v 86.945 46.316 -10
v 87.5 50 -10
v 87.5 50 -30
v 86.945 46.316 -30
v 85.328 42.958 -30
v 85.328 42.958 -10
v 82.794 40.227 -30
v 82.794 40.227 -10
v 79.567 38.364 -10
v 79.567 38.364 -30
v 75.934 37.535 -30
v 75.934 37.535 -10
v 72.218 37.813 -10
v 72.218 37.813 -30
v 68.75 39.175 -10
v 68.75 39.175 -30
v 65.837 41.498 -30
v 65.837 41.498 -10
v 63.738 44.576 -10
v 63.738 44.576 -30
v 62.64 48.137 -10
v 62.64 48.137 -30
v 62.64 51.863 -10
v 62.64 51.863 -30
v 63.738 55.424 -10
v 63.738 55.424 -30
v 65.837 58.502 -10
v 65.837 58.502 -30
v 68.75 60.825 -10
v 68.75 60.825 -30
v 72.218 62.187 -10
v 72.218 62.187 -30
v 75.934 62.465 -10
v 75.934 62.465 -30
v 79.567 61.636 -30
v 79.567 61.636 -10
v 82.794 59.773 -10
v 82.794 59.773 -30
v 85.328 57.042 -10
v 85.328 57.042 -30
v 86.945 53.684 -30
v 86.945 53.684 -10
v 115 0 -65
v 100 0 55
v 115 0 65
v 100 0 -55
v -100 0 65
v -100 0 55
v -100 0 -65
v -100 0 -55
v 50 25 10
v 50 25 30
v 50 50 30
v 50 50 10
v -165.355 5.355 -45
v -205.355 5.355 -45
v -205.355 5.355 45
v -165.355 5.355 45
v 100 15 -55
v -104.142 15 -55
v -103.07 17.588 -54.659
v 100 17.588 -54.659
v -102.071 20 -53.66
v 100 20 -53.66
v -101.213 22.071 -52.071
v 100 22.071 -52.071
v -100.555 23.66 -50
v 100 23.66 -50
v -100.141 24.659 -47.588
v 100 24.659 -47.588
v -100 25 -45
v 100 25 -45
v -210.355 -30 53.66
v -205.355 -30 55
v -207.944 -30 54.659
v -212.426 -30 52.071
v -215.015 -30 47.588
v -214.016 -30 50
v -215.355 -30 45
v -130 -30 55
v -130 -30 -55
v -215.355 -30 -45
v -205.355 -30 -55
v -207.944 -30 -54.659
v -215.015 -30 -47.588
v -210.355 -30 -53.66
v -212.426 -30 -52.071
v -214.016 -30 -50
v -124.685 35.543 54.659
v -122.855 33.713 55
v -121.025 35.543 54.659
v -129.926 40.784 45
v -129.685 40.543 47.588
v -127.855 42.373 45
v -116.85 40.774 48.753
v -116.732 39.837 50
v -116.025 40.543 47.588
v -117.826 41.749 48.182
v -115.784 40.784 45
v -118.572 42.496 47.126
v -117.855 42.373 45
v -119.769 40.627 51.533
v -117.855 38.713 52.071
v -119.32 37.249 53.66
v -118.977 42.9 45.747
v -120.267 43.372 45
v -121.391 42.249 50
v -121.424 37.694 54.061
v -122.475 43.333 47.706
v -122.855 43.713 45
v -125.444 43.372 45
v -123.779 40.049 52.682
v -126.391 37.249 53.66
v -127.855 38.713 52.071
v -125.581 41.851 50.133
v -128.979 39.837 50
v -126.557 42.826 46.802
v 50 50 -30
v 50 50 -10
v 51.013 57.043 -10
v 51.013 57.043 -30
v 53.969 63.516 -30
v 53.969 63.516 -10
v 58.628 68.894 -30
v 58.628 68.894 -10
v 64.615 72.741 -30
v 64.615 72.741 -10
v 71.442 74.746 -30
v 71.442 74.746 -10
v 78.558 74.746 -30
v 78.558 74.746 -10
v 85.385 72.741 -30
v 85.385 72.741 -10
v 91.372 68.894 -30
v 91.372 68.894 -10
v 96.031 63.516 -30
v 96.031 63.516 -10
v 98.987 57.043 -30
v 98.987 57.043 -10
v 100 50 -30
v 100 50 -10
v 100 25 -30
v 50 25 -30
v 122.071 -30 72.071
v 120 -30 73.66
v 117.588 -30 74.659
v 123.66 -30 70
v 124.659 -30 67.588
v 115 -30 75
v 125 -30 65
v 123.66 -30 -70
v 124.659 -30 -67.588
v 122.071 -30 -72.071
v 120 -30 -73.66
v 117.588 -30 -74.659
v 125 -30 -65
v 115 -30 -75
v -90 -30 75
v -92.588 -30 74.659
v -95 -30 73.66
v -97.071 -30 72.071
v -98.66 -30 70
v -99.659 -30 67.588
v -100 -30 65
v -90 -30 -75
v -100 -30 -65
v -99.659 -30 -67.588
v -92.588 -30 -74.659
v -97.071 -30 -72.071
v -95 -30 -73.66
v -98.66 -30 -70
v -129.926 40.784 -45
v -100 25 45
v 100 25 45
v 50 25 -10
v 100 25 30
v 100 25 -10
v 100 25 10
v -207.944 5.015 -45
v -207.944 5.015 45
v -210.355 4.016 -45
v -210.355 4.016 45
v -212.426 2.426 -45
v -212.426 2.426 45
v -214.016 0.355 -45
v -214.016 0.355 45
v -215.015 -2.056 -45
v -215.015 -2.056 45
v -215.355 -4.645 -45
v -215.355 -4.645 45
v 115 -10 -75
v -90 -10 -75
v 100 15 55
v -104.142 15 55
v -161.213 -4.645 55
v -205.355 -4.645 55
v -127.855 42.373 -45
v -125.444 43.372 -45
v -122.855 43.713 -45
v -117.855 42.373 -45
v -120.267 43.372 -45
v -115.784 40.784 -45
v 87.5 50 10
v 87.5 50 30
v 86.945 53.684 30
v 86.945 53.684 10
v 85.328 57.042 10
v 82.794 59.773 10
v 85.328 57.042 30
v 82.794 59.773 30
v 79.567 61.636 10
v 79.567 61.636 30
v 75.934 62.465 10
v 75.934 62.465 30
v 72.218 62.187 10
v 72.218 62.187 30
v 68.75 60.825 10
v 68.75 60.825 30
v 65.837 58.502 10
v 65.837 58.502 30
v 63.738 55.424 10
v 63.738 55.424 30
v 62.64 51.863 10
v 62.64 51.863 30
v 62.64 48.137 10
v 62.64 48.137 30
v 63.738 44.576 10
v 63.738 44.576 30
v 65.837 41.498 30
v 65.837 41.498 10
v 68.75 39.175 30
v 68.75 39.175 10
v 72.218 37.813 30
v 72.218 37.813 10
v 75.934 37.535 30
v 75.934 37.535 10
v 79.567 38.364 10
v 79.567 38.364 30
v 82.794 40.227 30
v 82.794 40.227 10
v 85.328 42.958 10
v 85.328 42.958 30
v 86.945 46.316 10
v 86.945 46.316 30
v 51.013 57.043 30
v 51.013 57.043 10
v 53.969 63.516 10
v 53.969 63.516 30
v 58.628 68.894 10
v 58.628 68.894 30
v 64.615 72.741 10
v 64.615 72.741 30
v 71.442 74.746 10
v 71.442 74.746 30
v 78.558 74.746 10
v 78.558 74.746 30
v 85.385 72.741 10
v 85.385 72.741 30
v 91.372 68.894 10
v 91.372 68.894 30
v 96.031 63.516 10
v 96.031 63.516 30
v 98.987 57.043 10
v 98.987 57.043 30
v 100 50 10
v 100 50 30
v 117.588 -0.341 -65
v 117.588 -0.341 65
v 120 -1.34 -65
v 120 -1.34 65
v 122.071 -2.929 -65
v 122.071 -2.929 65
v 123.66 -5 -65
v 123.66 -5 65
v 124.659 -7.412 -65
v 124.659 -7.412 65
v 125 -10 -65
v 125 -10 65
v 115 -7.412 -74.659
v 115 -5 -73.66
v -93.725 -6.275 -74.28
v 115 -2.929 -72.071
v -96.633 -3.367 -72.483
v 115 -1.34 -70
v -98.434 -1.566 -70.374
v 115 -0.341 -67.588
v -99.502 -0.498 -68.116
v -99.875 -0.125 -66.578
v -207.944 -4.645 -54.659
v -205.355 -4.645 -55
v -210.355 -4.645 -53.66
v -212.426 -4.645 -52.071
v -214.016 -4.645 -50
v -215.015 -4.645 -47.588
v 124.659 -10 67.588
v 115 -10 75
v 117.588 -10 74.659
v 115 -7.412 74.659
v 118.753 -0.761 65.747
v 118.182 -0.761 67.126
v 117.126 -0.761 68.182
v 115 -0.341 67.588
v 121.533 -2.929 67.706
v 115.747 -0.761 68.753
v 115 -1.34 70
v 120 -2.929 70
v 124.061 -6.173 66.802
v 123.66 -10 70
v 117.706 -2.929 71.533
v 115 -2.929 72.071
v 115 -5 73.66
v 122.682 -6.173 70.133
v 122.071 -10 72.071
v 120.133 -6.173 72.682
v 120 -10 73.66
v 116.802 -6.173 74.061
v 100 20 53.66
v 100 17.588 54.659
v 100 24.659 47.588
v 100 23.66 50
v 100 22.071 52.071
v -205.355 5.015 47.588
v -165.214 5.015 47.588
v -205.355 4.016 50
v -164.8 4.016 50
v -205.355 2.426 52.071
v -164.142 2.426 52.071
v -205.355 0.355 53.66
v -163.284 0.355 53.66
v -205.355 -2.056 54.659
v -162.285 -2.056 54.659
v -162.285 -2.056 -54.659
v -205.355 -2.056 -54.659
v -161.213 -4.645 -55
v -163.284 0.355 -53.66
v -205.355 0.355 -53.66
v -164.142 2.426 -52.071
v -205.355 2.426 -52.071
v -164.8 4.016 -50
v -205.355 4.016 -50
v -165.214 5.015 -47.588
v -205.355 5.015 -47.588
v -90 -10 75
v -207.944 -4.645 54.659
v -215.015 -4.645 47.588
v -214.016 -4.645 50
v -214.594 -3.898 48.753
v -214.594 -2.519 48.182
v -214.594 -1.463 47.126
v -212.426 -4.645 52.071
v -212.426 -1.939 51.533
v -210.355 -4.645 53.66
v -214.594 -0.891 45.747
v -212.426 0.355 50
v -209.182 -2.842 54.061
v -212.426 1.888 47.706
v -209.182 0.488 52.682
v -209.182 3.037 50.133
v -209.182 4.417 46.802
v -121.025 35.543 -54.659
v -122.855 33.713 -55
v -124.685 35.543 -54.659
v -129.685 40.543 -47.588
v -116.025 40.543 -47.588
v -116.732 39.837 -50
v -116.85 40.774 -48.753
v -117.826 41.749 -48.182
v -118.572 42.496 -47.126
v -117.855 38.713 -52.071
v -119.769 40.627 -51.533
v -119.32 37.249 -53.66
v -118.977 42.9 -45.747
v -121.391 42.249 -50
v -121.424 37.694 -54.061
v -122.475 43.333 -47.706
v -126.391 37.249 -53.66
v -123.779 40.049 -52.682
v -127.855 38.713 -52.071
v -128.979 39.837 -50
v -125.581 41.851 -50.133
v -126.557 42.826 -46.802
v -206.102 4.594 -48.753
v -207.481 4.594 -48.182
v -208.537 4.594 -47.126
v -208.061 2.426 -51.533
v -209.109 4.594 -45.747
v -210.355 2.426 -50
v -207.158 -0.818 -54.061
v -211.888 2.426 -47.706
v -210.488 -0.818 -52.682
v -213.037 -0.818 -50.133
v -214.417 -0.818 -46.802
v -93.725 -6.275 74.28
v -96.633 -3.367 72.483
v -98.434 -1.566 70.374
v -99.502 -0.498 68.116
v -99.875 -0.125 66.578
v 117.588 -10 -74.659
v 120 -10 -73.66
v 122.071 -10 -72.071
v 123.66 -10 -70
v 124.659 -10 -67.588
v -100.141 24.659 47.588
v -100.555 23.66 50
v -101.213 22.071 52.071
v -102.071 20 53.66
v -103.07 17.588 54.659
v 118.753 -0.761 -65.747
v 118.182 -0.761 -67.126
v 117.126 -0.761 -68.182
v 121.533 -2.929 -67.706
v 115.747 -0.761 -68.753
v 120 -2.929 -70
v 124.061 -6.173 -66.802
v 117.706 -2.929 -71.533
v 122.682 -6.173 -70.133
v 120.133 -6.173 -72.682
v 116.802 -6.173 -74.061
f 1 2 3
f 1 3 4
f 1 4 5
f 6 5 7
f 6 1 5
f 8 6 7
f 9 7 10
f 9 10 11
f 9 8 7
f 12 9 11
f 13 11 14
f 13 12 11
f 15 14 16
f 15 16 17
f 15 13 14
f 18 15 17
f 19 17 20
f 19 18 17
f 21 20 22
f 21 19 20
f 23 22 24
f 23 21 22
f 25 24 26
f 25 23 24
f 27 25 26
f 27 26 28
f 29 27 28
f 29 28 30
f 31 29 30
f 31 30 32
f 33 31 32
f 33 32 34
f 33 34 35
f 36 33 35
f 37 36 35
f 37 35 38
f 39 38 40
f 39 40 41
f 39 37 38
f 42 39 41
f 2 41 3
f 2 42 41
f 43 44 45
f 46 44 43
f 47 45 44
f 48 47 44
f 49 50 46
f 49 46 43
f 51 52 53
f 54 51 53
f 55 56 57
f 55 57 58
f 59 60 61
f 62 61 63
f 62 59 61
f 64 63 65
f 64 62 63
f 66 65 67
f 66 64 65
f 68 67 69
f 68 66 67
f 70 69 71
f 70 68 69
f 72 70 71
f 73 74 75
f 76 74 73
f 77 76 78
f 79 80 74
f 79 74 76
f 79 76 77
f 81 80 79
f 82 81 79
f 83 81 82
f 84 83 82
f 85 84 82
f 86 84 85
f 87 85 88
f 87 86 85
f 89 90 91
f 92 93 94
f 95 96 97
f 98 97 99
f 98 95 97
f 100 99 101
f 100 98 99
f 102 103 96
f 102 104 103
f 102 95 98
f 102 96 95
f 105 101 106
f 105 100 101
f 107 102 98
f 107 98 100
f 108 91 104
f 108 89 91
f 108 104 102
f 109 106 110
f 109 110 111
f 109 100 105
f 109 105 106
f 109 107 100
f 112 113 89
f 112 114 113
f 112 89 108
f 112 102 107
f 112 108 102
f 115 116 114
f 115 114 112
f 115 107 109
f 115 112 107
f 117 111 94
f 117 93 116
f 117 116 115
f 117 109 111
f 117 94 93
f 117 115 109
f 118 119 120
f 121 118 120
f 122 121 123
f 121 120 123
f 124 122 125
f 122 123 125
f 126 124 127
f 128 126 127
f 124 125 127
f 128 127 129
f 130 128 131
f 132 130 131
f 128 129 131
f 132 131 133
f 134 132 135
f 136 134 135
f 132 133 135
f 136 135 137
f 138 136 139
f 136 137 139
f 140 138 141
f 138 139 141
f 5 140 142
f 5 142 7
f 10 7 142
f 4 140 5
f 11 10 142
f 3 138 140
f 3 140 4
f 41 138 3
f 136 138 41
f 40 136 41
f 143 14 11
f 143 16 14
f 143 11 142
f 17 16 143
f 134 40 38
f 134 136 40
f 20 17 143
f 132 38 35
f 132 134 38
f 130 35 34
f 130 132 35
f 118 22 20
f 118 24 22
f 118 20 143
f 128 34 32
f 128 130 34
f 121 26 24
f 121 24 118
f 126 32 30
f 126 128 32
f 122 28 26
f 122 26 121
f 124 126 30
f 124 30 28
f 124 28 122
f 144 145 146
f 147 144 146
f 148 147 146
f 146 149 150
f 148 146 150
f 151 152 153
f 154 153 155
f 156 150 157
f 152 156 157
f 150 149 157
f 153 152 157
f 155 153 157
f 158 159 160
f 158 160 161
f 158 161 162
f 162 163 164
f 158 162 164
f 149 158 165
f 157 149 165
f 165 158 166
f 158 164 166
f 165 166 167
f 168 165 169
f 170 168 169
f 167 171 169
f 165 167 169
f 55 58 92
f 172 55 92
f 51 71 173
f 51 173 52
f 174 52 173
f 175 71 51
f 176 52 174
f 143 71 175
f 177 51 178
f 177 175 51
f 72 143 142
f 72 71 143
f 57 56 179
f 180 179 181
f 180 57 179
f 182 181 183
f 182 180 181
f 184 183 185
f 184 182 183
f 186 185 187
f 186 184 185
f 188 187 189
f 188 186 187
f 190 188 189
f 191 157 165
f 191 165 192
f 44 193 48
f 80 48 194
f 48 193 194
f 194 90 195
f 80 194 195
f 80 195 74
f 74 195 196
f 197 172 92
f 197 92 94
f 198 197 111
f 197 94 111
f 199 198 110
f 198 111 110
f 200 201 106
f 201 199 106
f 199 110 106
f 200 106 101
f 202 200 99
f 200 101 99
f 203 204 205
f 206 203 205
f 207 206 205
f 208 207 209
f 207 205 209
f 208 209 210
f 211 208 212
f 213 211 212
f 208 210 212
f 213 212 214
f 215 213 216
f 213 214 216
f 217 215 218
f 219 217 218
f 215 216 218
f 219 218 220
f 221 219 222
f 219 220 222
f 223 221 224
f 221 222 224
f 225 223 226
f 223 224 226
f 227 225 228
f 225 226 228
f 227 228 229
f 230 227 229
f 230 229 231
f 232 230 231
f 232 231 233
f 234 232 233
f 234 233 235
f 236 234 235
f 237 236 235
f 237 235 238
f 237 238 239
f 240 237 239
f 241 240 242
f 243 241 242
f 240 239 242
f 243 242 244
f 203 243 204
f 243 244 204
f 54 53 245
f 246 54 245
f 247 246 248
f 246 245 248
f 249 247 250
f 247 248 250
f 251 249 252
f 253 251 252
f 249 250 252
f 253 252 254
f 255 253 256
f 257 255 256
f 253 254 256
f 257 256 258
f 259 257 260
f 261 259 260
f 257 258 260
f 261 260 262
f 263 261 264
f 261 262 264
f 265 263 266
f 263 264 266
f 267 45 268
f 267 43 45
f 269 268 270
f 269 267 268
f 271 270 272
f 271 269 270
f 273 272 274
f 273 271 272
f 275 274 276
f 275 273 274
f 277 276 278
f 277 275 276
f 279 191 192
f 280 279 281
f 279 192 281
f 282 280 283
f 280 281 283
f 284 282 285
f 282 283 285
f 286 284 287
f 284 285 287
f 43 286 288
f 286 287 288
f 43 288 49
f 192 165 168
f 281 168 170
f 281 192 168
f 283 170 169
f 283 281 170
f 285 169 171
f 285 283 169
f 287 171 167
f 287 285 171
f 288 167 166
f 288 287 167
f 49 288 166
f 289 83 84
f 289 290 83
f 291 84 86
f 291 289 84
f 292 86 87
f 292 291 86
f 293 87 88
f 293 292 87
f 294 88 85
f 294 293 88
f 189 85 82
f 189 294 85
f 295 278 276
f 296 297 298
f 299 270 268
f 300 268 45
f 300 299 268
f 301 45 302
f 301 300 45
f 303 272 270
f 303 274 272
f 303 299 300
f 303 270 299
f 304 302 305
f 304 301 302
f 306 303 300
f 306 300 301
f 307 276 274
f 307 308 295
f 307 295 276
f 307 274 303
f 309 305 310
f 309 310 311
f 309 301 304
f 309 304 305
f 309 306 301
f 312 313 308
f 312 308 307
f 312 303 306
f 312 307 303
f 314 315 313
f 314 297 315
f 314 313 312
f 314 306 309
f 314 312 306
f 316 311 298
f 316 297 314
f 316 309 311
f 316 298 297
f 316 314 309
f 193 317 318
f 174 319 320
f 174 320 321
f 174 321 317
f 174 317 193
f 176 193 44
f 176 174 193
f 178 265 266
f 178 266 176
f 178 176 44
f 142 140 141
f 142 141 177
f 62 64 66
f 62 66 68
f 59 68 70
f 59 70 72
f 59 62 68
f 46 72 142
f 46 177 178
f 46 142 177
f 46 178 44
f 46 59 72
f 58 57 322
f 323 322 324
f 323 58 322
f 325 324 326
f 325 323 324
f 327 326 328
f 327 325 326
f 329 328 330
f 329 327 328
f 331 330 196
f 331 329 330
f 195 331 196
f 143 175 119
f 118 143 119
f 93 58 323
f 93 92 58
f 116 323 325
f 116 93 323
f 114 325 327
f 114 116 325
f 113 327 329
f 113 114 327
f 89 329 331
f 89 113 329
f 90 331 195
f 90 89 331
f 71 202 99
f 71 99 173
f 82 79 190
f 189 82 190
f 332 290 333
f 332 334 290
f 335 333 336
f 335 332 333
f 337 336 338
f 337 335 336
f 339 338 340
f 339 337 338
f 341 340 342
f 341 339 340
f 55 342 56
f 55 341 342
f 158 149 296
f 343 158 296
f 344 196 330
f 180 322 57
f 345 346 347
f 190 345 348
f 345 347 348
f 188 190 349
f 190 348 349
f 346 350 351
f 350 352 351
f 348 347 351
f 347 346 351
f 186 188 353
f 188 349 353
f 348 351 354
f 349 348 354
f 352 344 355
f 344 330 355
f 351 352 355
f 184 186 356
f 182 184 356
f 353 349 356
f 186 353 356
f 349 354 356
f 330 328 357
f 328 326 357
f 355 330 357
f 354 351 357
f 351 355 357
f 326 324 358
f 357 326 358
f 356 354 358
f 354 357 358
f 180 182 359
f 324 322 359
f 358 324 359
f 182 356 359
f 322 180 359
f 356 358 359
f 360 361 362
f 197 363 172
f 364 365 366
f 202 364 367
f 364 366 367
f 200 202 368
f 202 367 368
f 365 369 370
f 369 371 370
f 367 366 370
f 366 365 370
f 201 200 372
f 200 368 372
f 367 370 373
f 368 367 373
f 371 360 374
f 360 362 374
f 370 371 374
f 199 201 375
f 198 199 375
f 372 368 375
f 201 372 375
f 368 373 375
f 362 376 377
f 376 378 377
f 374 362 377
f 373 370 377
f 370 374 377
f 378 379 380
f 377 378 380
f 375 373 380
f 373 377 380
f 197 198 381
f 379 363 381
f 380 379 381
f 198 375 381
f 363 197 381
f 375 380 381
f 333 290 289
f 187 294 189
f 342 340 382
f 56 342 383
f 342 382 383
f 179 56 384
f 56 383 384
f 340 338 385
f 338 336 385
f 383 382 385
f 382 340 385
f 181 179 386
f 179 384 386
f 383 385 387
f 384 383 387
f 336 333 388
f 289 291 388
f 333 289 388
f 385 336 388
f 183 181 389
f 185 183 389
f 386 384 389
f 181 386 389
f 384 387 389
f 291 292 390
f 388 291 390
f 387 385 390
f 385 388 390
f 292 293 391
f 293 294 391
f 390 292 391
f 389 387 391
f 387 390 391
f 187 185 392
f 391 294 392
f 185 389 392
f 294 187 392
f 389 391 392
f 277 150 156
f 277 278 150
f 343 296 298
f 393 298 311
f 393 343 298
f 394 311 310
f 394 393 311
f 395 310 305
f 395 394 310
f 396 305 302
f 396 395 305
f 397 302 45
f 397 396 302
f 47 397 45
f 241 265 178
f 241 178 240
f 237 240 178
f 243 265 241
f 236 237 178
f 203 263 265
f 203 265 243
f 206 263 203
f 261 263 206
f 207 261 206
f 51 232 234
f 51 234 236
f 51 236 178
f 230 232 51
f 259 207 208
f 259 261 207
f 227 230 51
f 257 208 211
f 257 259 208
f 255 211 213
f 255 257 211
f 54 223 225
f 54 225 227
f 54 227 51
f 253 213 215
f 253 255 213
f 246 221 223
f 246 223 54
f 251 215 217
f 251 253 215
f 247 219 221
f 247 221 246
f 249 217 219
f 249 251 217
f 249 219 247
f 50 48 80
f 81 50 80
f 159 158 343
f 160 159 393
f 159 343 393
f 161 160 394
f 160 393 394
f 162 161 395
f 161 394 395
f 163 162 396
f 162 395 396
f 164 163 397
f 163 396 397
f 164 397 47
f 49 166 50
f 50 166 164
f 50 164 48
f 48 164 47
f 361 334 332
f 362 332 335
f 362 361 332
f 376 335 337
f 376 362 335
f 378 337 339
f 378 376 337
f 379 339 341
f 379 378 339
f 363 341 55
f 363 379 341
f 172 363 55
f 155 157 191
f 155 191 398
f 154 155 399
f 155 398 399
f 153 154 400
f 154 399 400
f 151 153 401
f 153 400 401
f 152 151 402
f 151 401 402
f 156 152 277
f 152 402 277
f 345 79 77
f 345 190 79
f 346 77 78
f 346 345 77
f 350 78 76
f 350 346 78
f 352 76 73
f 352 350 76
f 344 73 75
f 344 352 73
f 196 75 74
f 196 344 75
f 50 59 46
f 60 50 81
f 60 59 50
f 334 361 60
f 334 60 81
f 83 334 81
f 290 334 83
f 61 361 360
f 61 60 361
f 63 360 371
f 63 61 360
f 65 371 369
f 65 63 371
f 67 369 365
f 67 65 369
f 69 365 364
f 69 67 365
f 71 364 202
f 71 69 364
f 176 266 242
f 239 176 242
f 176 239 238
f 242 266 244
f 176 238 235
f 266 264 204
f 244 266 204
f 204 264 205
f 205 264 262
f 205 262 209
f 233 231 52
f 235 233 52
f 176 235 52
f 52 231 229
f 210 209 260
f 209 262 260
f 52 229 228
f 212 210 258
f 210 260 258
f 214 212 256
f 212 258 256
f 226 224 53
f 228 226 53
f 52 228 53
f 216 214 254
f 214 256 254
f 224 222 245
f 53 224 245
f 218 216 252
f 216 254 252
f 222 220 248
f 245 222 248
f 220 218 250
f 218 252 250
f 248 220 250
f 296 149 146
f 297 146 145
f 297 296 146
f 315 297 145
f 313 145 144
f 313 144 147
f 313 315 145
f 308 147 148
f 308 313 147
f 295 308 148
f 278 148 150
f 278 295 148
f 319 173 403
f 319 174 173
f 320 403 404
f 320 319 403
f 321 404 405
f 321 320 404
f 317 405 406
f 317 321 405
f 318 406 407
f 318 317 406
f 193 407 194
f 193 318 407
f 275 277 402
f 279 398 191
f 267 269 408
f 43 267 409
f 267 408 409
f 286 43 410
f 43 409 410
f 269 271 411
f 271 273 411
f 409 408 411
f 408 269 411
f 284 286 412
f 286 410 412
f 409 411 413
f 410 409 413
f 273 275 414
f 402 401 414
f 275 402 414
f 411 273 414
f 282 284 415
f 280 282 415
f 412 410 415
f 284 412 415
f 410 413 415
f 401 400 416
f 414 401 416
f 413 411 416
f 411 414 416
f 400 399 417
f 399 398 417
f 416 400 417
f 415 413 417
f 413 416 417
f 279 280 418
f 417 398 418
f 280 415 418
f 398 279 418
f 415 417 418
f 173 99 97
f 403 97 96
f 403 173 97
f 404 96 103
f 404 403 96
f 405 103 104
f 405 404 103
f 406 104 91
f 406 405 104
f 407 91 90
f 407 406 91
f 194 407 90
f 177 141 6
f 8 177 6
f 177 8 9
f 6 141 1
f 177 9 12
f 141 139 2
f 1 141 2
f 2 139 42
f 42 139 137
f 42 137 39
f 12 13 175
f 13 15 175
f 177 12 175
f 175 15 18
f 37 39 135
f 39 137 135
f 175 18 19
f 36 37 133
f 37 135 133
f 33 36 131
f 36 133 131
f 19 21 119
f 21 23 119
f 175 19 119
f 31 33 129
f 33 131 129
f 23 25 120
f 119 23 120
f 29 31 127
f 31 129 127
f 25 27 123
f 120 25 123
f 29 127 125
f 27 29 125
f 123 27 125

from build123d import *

# Parameters (mm, degrees)
BOSS_EXTRUDE1_DEPTH = 30
BOSS_EXTRUDE2_DEPTH = 30
SKETCH2_5_W         = 200
SKETCH2_5_H         = 30
BOSS_EXTRUDE3_DEPTH = 75
SKETCH2_6_W         = 200
SKETCH2_6_H         = 30
BOSS_EXTRUDE4_DEPTH = 75
SKETCH3_R           = 12.5
BOSS_EXTRUDE5_DEPTH = 20
BOSS_EXTRUDE6_START = -20
SKETCH4_R           = 12.5
BOSS_EXTRUDE6_DEPTH = 20
BOSS_EXTRUDE7_DEPTH = 25
BOSS_EXTRUDE8_DEPTH = 25
SKETCH7_W           = 150
SKETCH7_H           = 30
BOSS_EXTRUDE9_DEPTH = 25
FILLET1_R           = 10


with BuildPart() as part:
    # Sketch2 → Boss-Extrude1 (new body)
    with BuildSketch(Plane.XY):
        Polygon((-130, -30), (-100, 0), (100, 0), (100, 25), (-100, 25), (-122.855339059, 47.855339059), (-165.355339059, 5.355339059), (-215.355339059, 5.355339059), (-215.355339059, -30), align=None)
    extrude(amount=BOSS_EXTRUDE1_DEPTH)

    # Sketch2<4> → Boss-Extrude2 (add)
    with BuildSketch(Plane.XY):
        Polygon((-130, -30), (-100, 0), (100, 0), (100, 25), (-100, 25), (-122.855339059, 47.855339059), (-165.355339059, 5.355339059), (-215.355339059, 5.355339059), (-215.355339059, -30), align=None)
    extrude(amount=-BOSS_EXTRUDE2_DEPTH)

    # Sketch2<5> → Boss-Extrude3 (add)
    with BuildSketch(Plane.XY):
        with Locations((0, -15)):
            Rectangle(SKETCH2_5_W, SKETCH2_5_H)
    extrude(amount=BOSS_EXTRUDE3_DEPTH)

    # Sketch2<6> → Boss-Extrude4 (add)
    with BuildSketch(Plane.XY):
        with Locations((0, -15)):
            Rectangle(SKETCH2_6_W, SKETCH2_6_H)
    extrude(amount=-BOSS_EXTRUDE4_DEPTH)

    # Sketch3 → Boss-Extrude5 (add)
    with BuildSketch(Plane.XY.offset(30)):
        with BuildLine():
            Line((100, 25), (50, 25))
            Line((50, 25), (50, 50))
            ThreePointArc((50, 50), (75, 75), (100, 50))
            Line((100, 50), (100, 25))
        make_face()
        with Locations((75, 50)):
            Circle(SKETCH3_R, mode=Mode.SUBTRACT)
    extrude(amount=-BOSS_EXTRUDE5_DEPTH)

    # Sketch4 → Boss-Extrude6 (add)
    with BuildSketch(Plane(origin=(0, 0, -30), x_dir=(-1, 0, 0), z_dir=(0, 0, -1)).offset(BOSS_EXTRUDE6_START)):
        with BuildLine():
            Line((-100, 25), (-50, 25))
            Line((-50, 25), (-50, 50))
            ThreePointArc((-50, 50), (-75, 75), (-100, 50))
            Line((-100, 50), (-100, 25))
        make_face()
        with Locations((-75, 50)):
            Circle(SKETCH4_R, mode=Mode.SUBTRACT)
    extrude(amount=BOSS_EXTRUDE6_DEPTH)

    # Sketch5 → Boss-Extrude7 (add)
    with BuildSketch(Plane(origin=(0, 0, -30), x_dir=(-1, 0, 0), z_dir=(0, 0, -1))):
        Polygon((122.855339059, 47.855339059), (100, 25), (-100, 25), (-100, 0), (100, 0), (130, -30), (215.355339059, -30), (215.355339059, 5.355339059), (165.355339059, 5.355339059), align=None)
    extrude(amount=BOSS_EXTRUDE7_DEPTH)

    # Sketch6 → Boss-Extrude8 (add)
    with BuildSketch(Plane.XY.offset(30)):
        Polygon((-122.855339059, 47.855339059), (-100, 25), (100, 25), (100, 0), (-100, 0), (-130, -30), (-215.355339059, -30), (-215.355339059, 5.355339059), (-165.355339059, 5.355339059), align=None)
    extrude(amount=BOSS_EXTRUDE8_DEPTH)

    # Sketch7 → Boss-Extrude9 (add)
    with BuildSketch(Plane(origin=(100, 0, 0), x_dir=(0, 0, -1), z_dir=(1, 0, 0))):
        with Locations((0, -15)):
            Rectangle(SKETCH7_W, SKETCH7_H)
    extrude(amount=BOSS_EXTRUDE9_DEPTH)

    # Fillet1
    fillet1_edges = [part.edges().sort_by_distance(p)[0] for p in [
        (-122.855339059, 47.855339059, 0),
        (-215.355339059, 5.355339059, 0),
        (-215.355339059, -12.32233047, -55),
        (-190.355339059, 5.355339059, -55),
        (-144.105339059, 26.605339059, -55),
        (-111.42766953, 36.42766953, -55),
        (0, 25, -55),
        (-100, -15, -75),
        (12.5, 0, -75),
        (-215.355339059, -12.32233047, 55),
        (-190.355339059, 5.355339059, 55),
        (-144.105339059, 26.605339059, 55),
        (-111.42766953, 36.42766953, 55),
        (0, 25, 55),
        (-100, -15, 75),
        (125, 0, 0),
        (12.5, 0, 75),
        (125, -15, -75),
        (125, -15, 75),
    ]]
    fillet(fillet1_edges, radius=FILLET1_R)


solid = part.part
